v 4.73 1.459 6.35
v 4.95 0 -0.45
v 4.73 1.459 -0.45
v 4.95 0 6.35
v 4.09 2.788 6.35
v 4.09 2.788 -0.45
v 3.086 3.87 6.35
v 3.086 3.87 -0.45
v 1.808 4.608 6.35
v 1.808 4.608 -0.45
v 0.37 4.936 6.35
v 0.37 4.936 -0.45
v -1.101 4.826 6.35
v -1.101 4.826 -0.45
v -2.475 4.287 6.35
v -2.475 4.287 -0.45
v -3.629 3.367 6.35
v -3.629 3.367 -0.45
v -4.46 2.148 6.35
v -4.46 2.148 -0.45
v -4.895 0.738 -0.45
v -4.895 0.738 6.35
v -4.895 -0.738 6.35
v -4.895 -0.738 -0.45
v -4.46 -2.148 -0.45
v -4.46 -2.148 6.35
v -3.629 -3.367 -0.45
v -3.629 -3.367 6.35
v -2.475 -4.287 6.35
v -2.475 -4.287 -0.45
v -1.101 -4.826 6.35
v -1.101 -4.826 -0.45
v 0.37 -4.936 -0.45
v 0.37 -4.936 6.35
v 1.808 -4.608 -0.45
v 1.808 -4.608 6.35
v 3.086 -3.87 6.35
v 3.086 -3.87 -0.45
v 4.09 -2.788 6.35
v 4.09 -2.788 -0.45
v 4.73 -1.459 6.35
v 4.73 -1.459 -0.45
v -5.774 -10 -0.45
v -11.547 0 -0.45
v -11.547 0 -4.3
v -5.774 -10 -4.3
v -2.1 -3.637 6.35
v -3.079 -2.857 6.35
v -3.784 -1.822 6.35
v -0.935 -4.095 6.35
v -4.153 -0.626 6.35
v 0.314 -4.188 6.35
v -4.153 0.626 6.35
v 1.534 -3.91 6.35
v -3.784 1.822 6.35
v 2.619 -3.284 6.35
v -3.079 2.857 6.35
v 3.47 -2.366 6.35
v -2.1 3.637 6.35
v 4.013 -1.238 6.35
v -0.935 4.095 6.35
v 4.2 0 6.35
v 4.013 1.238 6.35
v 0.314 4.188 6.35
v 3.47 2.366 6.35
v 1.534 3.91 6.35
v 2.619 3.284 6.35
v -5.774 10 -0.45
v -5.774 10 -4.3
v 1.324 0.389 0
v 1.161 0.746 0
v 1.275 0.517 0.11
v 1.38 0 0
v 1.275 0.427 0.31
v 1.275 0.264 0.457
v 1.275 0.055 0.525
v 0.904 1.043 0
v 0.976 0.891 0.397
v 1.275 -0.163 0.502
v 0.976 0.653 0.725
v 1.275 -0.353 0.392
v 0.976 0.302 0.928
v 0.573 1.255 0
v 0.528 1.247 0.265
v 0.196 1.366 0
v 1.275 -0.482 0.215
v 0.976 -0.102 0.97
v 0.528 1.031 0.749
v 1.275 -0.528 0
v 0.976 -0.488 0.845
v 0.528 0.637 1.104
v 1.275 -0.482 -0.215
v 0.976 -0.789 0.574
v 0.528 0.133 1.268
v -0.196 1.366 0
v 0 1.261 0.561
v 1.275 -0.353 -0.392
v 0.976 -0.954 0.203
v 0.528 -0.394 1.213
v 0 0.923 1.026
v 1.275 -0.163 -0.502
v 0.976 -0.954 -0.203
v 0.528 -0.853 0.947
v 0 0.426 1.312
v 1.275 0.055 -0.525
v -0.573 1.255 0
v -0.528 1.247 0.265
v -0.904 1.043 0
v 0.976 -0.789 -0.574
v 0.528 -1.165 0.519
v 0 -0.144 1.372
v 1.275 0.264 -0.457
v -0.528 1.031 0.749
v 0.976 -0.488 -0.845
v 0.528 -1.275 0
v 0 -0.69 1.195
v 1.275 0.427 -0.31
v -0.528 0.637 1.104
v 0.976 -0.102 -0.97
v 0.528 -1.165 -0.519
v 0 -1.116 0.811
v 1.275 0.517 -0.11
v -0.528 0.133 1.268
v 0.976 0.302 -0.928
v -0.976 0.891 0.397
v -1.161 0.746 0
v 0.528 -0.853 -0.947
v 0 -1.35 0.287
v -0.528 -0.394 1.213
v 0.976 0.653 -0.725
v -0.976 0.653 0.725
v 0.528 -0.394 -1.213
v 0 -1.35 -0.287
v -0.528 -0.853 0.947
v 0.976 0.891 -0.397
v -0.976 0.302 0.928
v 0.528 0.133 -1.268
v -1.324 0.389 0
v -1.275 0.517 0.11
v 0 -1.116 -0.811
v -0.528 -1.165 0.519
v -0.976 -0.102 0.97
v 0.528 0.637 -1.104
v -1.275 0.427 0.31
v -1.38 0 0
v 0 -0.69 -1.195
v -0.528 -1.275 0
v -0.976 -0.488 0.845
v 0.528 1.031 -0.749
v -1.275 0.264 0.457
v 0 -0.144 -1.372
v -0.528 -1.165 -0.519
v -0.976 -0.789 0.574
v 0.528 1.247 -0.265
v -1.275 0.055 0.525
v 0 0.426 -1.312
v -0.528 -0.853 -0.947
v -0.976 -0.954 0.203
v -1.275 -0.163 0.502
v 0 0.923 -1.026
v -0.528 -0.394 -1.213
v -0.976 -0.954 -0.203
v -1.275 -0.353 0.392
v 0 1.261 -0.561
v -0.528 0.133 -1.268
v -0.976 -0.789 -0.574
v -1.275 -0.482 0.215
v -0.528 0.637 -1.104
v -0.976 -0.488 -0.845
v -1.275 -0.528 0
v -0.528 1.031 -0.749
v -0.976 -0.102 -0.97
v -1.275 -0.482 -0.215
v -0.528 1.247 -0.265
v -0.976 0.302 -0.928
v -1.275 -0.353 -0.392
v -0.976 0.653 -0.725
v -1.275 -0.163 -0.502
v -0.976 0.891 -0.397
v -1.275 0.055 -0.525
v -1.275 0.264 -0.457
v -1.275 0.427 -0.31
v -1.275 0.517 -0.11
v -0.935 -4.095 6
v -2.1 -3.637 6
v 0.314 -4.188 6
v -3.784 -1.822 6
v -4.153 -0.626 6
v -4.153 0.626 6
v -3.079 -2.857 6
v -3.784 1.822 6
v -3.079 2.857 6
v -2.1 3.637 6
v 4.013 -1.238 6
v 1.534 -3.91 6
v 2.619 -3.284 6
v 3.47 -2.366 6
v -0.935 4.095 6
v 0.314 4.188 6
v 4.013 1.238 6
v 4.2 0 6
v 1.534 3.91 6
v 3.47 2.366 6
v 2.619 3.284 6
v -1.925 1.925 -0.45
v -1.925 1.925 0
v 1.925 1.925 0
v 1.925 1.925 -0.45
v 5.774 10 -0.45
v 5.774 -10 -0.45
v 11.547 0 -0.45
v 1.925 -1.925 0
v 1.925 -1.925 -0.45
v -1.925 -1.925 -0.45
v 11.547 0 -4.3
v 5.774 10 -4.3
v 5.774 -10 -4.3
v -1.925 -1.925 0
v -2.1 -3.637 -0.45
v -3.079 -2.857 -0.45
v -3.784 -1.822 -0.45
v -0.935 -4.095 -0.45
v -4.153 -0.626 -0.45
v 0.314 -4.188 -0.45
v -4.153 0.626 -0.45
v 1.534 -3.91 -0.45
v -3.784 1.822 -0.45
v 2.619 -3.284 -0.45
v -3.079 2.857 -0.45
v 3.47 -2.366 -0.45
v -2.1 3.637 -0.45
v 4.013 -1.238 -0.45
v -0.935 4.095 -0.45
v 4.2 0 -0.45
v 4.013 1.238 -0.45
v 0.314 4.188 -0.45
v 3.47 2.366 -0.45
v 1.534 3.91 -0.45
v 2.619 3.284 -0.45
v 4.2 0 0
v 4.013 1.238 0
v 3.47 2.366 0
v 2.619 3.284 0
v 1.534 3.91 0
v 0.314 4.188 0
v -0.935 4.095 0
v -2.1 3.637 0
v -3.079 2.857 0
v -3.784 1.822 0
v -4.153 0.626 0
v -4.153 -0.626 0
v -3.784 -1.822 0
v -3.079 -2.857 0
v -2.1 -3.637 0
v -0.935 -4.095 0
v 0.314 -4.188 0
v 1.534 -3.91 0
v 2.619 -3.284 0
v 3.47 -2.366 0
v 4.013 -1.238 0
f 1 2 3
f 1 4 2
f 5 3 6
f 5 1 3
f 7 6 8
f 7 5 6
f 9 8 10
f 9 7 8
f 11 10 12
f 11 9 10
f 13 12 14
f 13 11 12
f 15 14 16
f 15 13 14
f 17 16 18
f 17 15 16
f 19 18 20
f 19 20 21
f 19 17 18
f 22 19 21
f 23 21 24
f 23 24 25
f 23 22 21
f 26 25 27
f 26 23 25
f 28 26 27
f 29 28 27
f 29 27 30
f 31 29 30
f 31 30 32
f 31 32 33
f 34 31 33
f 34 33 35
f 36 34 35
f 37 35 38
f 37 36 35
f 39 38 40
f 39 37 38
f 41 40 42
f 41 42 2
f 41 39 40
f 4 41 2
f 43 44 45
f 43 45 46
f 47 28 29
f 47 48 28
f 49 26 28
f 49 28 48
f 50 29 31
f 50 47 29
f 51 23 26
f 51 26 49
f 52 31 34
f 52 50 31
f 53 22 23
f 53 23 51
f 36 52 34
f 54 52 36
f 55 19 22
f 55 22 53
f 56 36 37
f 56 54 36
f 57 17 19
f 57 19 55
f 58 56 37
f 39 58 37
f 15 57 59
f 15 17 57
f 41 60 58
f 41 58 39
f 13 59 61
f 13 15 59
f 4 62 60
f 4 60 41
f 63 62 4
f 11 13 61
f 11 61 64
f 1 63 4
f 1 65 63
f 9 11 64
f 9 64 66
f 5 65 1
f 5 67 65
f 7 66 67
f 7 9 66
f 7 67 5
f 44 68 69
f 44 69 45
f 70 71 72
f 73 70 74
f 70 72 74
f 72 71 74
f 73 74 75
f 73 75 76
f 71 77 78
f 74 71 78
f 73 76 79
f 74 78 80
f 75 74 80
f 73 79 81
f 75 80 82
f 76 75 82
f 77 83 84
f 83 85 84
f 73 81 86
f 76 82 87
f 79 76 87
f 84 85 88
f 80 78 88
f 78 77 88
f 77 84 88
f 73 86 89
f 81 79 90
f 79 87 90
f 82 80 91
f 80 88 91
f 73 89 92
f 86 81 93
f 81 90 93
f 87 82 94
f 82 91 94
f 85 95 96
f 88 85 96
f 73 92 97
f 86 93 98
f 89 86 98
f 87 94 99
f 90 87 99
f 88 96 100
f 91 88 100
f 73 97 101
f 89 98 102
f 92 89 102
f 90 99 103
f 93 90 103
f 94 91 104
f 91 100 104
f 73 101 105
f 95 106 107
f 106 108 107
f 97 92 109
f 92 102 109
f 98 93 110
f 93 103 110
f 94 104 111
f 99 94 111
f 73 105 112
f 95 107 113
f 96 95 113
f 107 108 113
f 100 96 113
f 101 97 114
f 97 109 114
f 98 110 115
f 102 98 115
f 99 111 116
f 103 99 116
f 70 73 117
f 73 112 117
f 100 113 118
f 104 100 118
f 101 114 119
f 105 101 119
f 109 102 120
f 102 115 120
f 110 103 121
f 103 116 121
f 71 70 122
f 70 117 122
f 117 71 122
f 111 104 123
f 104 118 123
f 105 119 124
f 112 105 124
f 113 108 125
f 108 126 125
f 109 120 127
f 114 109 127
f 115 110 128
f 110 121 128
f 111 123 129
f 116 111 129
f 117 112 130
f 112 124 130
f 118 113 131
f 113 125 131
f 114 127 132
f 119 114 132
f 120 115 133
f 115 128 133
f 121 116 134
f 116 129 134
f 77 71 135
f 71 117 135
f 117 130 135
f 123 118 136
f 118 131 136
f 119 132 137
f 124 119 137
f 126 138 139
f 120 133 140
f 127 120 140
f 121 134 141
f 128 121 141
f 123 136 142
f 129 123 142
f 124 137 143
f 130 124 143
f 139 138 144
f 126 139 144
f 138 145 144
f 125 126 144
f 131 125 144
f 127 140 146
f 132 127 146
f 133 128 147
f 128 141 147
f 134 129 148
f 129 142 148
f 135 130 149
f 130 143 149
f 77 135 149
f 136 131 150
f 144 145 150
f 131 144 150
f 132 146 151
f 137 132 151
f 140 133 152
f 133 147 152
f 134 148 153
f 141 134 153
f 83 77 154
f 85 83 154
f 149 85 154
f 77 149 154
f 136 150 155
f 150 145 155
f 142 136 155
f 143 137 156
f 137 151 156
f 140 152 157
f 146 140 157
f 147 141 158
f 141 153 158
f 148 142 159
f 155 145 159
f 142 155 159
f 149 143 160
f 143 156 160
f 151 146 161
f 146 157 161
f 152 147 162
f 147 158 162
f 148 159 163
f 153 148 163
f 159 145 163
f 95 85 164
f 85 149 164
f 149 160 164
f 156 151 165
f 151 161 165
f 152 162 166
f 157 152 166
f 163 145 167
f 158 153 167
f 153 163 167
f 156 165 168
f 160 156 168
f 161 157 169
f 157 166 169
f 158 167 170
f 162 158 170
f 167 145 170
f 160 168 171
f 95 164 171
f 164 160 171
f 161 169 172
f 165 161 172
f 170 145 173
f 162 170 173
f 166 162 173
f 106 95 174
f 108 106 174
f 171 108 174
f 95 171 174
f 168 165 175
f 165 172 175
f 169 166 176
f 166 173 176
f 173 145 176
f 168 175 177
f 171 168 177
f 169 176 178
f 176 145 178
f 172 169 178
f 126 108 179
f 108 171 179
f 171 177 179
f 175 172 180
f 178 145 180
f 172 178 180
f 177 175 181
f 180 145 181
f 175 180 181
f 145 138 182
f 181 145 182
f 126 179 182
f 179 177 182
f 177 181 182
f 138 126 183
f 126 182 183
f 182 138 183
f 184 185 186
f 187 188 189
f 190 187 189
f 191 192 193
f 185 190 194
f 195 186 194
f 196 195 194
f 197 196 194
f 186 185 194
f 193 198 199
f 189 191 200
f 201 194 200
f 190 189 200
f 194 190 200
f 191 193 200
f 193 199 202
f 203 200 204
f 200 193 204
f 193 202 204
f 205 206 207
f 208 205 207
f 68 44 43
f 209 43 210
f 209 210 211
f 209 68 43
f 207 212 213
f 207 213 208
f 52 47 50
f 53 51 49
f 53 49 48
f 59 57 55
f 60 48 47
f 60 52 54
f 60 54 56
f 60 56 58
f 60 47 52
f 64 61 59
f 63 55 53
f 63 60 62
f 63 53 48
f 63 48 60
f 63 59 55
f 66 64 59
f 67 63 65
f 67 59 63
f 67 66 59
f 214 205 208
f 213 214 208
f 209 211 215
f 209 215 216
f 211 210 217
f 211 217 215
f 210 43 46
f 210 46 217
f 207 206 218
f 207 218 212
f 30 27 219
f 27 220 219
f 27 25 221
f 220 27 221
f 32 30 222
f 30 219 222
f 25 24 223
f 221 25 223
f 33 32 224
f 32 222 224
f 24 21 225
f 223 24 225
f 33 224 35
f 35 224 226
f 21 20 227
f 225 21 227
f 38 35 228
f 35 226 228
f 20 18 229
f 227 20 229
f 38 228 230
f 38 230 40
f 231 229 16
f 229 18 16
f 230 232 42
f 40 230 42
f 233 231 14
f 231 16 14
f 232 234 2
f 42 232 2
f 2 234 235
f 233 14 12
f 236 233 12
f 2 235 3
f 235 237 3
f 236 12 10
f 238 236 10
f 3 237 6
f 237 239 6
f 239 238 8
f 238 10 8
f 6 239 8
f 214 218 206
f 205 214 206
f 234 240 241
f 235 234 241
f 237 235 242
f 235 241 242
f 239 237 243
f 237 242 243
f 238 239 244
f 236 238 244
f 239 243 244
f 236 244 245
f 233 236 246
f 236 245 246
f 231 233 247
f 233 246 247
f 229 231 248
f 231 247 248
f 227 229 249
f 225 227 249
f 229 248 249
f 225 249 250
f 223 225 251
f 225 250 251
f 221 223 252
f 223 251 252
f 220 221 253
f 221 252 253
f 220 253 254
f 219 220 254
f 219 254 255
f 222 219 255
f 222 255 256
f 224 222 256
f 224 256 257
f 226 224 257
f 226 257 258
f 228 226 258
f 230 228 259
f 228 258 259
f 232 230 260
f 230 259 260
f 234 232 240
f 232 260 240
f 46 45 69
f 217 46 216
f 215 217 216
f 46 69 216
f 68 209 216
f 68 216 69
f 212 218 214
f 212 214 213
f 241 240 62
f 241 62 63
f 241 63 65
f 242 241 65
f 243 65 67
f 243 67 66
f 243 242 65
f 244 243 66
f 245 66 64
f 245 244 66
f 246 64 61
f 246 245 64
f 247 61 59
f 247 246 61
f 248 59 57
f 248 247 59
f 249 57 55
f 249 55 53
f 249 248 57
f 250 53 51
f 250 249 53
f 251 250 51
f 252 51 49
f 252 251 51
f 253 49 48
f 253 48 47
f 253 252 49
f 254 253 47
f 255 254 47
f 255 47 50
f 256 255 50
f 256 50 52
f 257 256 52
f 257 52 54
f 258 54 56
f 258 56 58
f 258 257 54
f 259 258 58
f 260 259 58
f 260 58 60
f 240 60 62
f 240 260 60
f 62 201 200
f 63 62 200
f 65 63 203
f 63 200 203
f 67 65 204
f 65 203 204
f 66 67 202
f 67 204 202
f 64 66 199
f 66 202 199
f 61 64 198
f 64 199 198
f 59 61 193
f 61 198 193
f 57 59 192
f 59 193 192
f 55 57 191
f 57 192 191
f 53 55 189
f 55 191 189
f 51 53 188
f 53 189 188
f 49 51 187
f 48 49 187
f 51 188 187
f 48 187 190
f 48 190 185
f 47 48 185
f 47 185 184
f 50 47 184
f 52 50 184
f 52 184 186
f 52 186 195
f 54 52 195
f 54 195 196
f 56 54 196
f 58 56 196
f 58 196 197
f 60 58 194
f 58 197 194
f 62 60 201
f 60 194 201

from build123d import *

# Parameters (mm, degrees)
F1_START      = -0.45
F1_DEPTH      = 3.85
F2_W          = 3.85
F2_H          = 3.85
F4_DEPTH      = 0.45
F5_R          = 4.95
F5_R_2        = 4.2
F6_DEPTH      = 6.35
F6_DEPTH_BACK = 0.45
F7_START      = 6
F7_DEPTH      = 0.35


with BuildPart() as f1:
    # F0 (on Top) → F1 (new body)
    with BuildSketch(Plane.XY.offset(F1_START)):
        Polygon((-5.7735026919, -10), (5.7735026919, -10), (11.5470053838, 0), (5.7735026919, 10), (-5.7735026919, 10), (-11.5470053838, 0), align=None)
    extrude(amount=-F1_DEPTH)


with BuildPart() as f3:
    # F2 (on Top) → F3 (revolve)
    with BuildSketch(Plane.XY):
        with BuildLine():
            Line((-1.38, 0), (1.38, 0))
            ThreePointArc((1.38, 0), (0, 1.38), (-1.38, 0))
        make_face()
    revolve(axis=Axis((0, 0, 0), (1, 0, 0)))


with BuildPart() as f4:
    # F2 (on Top) → F4 (new body)
    with BuildSketch(Plane.XY):
        Rectangle(F2_W, F2_H)
        with BuildLine():
            ThreePointArc((-1.38, 0), (0, 1.38), (1.38, 0))
            ThreePointArc((1.38, 0), (0, -1.38), (-1.38, 0))
        make_face(mode=Mode.SUBTRACT)
        with BuildLine():
            Line((-1.38, 0), (1.38, 0))
            ThreePointArc((1.38, 0), (0, 1.38), (-1.38, 0))
        make_face()
        with BuildLine():
            ThreePointArc((-1.38, 0), (0, -1.38), (1.38, 0))
            Line((1.38, 0), (-1.38, 0))
        make_face()
    extrude(amount=-F4_DEPTH)


with BuildPart() as f6:
    # F5 (on Top) → F6 (new body, two sides)
    with BuildSketch(Plane.XY) as f6_sk:
        Circle(F5_R)
        Circle(F5_R_2, mode=Mode.SUBTRACT)
    extrude(amount=F6_DEPTH)
    extrude(f6_sk.sketch, amount=-F6_DEPTH_BACK)


with BuildPart() as f7:
    # F5 (on Top) → F7 (new body)
    with BuildSketch(Plane.XY.offset(F7_START)):
        Circle(F5_R_2)
    extrude(amount=F7_DEPTH)


solid = Compound([f1.part, f3.part, f4.part, f6.part, f7.part])
